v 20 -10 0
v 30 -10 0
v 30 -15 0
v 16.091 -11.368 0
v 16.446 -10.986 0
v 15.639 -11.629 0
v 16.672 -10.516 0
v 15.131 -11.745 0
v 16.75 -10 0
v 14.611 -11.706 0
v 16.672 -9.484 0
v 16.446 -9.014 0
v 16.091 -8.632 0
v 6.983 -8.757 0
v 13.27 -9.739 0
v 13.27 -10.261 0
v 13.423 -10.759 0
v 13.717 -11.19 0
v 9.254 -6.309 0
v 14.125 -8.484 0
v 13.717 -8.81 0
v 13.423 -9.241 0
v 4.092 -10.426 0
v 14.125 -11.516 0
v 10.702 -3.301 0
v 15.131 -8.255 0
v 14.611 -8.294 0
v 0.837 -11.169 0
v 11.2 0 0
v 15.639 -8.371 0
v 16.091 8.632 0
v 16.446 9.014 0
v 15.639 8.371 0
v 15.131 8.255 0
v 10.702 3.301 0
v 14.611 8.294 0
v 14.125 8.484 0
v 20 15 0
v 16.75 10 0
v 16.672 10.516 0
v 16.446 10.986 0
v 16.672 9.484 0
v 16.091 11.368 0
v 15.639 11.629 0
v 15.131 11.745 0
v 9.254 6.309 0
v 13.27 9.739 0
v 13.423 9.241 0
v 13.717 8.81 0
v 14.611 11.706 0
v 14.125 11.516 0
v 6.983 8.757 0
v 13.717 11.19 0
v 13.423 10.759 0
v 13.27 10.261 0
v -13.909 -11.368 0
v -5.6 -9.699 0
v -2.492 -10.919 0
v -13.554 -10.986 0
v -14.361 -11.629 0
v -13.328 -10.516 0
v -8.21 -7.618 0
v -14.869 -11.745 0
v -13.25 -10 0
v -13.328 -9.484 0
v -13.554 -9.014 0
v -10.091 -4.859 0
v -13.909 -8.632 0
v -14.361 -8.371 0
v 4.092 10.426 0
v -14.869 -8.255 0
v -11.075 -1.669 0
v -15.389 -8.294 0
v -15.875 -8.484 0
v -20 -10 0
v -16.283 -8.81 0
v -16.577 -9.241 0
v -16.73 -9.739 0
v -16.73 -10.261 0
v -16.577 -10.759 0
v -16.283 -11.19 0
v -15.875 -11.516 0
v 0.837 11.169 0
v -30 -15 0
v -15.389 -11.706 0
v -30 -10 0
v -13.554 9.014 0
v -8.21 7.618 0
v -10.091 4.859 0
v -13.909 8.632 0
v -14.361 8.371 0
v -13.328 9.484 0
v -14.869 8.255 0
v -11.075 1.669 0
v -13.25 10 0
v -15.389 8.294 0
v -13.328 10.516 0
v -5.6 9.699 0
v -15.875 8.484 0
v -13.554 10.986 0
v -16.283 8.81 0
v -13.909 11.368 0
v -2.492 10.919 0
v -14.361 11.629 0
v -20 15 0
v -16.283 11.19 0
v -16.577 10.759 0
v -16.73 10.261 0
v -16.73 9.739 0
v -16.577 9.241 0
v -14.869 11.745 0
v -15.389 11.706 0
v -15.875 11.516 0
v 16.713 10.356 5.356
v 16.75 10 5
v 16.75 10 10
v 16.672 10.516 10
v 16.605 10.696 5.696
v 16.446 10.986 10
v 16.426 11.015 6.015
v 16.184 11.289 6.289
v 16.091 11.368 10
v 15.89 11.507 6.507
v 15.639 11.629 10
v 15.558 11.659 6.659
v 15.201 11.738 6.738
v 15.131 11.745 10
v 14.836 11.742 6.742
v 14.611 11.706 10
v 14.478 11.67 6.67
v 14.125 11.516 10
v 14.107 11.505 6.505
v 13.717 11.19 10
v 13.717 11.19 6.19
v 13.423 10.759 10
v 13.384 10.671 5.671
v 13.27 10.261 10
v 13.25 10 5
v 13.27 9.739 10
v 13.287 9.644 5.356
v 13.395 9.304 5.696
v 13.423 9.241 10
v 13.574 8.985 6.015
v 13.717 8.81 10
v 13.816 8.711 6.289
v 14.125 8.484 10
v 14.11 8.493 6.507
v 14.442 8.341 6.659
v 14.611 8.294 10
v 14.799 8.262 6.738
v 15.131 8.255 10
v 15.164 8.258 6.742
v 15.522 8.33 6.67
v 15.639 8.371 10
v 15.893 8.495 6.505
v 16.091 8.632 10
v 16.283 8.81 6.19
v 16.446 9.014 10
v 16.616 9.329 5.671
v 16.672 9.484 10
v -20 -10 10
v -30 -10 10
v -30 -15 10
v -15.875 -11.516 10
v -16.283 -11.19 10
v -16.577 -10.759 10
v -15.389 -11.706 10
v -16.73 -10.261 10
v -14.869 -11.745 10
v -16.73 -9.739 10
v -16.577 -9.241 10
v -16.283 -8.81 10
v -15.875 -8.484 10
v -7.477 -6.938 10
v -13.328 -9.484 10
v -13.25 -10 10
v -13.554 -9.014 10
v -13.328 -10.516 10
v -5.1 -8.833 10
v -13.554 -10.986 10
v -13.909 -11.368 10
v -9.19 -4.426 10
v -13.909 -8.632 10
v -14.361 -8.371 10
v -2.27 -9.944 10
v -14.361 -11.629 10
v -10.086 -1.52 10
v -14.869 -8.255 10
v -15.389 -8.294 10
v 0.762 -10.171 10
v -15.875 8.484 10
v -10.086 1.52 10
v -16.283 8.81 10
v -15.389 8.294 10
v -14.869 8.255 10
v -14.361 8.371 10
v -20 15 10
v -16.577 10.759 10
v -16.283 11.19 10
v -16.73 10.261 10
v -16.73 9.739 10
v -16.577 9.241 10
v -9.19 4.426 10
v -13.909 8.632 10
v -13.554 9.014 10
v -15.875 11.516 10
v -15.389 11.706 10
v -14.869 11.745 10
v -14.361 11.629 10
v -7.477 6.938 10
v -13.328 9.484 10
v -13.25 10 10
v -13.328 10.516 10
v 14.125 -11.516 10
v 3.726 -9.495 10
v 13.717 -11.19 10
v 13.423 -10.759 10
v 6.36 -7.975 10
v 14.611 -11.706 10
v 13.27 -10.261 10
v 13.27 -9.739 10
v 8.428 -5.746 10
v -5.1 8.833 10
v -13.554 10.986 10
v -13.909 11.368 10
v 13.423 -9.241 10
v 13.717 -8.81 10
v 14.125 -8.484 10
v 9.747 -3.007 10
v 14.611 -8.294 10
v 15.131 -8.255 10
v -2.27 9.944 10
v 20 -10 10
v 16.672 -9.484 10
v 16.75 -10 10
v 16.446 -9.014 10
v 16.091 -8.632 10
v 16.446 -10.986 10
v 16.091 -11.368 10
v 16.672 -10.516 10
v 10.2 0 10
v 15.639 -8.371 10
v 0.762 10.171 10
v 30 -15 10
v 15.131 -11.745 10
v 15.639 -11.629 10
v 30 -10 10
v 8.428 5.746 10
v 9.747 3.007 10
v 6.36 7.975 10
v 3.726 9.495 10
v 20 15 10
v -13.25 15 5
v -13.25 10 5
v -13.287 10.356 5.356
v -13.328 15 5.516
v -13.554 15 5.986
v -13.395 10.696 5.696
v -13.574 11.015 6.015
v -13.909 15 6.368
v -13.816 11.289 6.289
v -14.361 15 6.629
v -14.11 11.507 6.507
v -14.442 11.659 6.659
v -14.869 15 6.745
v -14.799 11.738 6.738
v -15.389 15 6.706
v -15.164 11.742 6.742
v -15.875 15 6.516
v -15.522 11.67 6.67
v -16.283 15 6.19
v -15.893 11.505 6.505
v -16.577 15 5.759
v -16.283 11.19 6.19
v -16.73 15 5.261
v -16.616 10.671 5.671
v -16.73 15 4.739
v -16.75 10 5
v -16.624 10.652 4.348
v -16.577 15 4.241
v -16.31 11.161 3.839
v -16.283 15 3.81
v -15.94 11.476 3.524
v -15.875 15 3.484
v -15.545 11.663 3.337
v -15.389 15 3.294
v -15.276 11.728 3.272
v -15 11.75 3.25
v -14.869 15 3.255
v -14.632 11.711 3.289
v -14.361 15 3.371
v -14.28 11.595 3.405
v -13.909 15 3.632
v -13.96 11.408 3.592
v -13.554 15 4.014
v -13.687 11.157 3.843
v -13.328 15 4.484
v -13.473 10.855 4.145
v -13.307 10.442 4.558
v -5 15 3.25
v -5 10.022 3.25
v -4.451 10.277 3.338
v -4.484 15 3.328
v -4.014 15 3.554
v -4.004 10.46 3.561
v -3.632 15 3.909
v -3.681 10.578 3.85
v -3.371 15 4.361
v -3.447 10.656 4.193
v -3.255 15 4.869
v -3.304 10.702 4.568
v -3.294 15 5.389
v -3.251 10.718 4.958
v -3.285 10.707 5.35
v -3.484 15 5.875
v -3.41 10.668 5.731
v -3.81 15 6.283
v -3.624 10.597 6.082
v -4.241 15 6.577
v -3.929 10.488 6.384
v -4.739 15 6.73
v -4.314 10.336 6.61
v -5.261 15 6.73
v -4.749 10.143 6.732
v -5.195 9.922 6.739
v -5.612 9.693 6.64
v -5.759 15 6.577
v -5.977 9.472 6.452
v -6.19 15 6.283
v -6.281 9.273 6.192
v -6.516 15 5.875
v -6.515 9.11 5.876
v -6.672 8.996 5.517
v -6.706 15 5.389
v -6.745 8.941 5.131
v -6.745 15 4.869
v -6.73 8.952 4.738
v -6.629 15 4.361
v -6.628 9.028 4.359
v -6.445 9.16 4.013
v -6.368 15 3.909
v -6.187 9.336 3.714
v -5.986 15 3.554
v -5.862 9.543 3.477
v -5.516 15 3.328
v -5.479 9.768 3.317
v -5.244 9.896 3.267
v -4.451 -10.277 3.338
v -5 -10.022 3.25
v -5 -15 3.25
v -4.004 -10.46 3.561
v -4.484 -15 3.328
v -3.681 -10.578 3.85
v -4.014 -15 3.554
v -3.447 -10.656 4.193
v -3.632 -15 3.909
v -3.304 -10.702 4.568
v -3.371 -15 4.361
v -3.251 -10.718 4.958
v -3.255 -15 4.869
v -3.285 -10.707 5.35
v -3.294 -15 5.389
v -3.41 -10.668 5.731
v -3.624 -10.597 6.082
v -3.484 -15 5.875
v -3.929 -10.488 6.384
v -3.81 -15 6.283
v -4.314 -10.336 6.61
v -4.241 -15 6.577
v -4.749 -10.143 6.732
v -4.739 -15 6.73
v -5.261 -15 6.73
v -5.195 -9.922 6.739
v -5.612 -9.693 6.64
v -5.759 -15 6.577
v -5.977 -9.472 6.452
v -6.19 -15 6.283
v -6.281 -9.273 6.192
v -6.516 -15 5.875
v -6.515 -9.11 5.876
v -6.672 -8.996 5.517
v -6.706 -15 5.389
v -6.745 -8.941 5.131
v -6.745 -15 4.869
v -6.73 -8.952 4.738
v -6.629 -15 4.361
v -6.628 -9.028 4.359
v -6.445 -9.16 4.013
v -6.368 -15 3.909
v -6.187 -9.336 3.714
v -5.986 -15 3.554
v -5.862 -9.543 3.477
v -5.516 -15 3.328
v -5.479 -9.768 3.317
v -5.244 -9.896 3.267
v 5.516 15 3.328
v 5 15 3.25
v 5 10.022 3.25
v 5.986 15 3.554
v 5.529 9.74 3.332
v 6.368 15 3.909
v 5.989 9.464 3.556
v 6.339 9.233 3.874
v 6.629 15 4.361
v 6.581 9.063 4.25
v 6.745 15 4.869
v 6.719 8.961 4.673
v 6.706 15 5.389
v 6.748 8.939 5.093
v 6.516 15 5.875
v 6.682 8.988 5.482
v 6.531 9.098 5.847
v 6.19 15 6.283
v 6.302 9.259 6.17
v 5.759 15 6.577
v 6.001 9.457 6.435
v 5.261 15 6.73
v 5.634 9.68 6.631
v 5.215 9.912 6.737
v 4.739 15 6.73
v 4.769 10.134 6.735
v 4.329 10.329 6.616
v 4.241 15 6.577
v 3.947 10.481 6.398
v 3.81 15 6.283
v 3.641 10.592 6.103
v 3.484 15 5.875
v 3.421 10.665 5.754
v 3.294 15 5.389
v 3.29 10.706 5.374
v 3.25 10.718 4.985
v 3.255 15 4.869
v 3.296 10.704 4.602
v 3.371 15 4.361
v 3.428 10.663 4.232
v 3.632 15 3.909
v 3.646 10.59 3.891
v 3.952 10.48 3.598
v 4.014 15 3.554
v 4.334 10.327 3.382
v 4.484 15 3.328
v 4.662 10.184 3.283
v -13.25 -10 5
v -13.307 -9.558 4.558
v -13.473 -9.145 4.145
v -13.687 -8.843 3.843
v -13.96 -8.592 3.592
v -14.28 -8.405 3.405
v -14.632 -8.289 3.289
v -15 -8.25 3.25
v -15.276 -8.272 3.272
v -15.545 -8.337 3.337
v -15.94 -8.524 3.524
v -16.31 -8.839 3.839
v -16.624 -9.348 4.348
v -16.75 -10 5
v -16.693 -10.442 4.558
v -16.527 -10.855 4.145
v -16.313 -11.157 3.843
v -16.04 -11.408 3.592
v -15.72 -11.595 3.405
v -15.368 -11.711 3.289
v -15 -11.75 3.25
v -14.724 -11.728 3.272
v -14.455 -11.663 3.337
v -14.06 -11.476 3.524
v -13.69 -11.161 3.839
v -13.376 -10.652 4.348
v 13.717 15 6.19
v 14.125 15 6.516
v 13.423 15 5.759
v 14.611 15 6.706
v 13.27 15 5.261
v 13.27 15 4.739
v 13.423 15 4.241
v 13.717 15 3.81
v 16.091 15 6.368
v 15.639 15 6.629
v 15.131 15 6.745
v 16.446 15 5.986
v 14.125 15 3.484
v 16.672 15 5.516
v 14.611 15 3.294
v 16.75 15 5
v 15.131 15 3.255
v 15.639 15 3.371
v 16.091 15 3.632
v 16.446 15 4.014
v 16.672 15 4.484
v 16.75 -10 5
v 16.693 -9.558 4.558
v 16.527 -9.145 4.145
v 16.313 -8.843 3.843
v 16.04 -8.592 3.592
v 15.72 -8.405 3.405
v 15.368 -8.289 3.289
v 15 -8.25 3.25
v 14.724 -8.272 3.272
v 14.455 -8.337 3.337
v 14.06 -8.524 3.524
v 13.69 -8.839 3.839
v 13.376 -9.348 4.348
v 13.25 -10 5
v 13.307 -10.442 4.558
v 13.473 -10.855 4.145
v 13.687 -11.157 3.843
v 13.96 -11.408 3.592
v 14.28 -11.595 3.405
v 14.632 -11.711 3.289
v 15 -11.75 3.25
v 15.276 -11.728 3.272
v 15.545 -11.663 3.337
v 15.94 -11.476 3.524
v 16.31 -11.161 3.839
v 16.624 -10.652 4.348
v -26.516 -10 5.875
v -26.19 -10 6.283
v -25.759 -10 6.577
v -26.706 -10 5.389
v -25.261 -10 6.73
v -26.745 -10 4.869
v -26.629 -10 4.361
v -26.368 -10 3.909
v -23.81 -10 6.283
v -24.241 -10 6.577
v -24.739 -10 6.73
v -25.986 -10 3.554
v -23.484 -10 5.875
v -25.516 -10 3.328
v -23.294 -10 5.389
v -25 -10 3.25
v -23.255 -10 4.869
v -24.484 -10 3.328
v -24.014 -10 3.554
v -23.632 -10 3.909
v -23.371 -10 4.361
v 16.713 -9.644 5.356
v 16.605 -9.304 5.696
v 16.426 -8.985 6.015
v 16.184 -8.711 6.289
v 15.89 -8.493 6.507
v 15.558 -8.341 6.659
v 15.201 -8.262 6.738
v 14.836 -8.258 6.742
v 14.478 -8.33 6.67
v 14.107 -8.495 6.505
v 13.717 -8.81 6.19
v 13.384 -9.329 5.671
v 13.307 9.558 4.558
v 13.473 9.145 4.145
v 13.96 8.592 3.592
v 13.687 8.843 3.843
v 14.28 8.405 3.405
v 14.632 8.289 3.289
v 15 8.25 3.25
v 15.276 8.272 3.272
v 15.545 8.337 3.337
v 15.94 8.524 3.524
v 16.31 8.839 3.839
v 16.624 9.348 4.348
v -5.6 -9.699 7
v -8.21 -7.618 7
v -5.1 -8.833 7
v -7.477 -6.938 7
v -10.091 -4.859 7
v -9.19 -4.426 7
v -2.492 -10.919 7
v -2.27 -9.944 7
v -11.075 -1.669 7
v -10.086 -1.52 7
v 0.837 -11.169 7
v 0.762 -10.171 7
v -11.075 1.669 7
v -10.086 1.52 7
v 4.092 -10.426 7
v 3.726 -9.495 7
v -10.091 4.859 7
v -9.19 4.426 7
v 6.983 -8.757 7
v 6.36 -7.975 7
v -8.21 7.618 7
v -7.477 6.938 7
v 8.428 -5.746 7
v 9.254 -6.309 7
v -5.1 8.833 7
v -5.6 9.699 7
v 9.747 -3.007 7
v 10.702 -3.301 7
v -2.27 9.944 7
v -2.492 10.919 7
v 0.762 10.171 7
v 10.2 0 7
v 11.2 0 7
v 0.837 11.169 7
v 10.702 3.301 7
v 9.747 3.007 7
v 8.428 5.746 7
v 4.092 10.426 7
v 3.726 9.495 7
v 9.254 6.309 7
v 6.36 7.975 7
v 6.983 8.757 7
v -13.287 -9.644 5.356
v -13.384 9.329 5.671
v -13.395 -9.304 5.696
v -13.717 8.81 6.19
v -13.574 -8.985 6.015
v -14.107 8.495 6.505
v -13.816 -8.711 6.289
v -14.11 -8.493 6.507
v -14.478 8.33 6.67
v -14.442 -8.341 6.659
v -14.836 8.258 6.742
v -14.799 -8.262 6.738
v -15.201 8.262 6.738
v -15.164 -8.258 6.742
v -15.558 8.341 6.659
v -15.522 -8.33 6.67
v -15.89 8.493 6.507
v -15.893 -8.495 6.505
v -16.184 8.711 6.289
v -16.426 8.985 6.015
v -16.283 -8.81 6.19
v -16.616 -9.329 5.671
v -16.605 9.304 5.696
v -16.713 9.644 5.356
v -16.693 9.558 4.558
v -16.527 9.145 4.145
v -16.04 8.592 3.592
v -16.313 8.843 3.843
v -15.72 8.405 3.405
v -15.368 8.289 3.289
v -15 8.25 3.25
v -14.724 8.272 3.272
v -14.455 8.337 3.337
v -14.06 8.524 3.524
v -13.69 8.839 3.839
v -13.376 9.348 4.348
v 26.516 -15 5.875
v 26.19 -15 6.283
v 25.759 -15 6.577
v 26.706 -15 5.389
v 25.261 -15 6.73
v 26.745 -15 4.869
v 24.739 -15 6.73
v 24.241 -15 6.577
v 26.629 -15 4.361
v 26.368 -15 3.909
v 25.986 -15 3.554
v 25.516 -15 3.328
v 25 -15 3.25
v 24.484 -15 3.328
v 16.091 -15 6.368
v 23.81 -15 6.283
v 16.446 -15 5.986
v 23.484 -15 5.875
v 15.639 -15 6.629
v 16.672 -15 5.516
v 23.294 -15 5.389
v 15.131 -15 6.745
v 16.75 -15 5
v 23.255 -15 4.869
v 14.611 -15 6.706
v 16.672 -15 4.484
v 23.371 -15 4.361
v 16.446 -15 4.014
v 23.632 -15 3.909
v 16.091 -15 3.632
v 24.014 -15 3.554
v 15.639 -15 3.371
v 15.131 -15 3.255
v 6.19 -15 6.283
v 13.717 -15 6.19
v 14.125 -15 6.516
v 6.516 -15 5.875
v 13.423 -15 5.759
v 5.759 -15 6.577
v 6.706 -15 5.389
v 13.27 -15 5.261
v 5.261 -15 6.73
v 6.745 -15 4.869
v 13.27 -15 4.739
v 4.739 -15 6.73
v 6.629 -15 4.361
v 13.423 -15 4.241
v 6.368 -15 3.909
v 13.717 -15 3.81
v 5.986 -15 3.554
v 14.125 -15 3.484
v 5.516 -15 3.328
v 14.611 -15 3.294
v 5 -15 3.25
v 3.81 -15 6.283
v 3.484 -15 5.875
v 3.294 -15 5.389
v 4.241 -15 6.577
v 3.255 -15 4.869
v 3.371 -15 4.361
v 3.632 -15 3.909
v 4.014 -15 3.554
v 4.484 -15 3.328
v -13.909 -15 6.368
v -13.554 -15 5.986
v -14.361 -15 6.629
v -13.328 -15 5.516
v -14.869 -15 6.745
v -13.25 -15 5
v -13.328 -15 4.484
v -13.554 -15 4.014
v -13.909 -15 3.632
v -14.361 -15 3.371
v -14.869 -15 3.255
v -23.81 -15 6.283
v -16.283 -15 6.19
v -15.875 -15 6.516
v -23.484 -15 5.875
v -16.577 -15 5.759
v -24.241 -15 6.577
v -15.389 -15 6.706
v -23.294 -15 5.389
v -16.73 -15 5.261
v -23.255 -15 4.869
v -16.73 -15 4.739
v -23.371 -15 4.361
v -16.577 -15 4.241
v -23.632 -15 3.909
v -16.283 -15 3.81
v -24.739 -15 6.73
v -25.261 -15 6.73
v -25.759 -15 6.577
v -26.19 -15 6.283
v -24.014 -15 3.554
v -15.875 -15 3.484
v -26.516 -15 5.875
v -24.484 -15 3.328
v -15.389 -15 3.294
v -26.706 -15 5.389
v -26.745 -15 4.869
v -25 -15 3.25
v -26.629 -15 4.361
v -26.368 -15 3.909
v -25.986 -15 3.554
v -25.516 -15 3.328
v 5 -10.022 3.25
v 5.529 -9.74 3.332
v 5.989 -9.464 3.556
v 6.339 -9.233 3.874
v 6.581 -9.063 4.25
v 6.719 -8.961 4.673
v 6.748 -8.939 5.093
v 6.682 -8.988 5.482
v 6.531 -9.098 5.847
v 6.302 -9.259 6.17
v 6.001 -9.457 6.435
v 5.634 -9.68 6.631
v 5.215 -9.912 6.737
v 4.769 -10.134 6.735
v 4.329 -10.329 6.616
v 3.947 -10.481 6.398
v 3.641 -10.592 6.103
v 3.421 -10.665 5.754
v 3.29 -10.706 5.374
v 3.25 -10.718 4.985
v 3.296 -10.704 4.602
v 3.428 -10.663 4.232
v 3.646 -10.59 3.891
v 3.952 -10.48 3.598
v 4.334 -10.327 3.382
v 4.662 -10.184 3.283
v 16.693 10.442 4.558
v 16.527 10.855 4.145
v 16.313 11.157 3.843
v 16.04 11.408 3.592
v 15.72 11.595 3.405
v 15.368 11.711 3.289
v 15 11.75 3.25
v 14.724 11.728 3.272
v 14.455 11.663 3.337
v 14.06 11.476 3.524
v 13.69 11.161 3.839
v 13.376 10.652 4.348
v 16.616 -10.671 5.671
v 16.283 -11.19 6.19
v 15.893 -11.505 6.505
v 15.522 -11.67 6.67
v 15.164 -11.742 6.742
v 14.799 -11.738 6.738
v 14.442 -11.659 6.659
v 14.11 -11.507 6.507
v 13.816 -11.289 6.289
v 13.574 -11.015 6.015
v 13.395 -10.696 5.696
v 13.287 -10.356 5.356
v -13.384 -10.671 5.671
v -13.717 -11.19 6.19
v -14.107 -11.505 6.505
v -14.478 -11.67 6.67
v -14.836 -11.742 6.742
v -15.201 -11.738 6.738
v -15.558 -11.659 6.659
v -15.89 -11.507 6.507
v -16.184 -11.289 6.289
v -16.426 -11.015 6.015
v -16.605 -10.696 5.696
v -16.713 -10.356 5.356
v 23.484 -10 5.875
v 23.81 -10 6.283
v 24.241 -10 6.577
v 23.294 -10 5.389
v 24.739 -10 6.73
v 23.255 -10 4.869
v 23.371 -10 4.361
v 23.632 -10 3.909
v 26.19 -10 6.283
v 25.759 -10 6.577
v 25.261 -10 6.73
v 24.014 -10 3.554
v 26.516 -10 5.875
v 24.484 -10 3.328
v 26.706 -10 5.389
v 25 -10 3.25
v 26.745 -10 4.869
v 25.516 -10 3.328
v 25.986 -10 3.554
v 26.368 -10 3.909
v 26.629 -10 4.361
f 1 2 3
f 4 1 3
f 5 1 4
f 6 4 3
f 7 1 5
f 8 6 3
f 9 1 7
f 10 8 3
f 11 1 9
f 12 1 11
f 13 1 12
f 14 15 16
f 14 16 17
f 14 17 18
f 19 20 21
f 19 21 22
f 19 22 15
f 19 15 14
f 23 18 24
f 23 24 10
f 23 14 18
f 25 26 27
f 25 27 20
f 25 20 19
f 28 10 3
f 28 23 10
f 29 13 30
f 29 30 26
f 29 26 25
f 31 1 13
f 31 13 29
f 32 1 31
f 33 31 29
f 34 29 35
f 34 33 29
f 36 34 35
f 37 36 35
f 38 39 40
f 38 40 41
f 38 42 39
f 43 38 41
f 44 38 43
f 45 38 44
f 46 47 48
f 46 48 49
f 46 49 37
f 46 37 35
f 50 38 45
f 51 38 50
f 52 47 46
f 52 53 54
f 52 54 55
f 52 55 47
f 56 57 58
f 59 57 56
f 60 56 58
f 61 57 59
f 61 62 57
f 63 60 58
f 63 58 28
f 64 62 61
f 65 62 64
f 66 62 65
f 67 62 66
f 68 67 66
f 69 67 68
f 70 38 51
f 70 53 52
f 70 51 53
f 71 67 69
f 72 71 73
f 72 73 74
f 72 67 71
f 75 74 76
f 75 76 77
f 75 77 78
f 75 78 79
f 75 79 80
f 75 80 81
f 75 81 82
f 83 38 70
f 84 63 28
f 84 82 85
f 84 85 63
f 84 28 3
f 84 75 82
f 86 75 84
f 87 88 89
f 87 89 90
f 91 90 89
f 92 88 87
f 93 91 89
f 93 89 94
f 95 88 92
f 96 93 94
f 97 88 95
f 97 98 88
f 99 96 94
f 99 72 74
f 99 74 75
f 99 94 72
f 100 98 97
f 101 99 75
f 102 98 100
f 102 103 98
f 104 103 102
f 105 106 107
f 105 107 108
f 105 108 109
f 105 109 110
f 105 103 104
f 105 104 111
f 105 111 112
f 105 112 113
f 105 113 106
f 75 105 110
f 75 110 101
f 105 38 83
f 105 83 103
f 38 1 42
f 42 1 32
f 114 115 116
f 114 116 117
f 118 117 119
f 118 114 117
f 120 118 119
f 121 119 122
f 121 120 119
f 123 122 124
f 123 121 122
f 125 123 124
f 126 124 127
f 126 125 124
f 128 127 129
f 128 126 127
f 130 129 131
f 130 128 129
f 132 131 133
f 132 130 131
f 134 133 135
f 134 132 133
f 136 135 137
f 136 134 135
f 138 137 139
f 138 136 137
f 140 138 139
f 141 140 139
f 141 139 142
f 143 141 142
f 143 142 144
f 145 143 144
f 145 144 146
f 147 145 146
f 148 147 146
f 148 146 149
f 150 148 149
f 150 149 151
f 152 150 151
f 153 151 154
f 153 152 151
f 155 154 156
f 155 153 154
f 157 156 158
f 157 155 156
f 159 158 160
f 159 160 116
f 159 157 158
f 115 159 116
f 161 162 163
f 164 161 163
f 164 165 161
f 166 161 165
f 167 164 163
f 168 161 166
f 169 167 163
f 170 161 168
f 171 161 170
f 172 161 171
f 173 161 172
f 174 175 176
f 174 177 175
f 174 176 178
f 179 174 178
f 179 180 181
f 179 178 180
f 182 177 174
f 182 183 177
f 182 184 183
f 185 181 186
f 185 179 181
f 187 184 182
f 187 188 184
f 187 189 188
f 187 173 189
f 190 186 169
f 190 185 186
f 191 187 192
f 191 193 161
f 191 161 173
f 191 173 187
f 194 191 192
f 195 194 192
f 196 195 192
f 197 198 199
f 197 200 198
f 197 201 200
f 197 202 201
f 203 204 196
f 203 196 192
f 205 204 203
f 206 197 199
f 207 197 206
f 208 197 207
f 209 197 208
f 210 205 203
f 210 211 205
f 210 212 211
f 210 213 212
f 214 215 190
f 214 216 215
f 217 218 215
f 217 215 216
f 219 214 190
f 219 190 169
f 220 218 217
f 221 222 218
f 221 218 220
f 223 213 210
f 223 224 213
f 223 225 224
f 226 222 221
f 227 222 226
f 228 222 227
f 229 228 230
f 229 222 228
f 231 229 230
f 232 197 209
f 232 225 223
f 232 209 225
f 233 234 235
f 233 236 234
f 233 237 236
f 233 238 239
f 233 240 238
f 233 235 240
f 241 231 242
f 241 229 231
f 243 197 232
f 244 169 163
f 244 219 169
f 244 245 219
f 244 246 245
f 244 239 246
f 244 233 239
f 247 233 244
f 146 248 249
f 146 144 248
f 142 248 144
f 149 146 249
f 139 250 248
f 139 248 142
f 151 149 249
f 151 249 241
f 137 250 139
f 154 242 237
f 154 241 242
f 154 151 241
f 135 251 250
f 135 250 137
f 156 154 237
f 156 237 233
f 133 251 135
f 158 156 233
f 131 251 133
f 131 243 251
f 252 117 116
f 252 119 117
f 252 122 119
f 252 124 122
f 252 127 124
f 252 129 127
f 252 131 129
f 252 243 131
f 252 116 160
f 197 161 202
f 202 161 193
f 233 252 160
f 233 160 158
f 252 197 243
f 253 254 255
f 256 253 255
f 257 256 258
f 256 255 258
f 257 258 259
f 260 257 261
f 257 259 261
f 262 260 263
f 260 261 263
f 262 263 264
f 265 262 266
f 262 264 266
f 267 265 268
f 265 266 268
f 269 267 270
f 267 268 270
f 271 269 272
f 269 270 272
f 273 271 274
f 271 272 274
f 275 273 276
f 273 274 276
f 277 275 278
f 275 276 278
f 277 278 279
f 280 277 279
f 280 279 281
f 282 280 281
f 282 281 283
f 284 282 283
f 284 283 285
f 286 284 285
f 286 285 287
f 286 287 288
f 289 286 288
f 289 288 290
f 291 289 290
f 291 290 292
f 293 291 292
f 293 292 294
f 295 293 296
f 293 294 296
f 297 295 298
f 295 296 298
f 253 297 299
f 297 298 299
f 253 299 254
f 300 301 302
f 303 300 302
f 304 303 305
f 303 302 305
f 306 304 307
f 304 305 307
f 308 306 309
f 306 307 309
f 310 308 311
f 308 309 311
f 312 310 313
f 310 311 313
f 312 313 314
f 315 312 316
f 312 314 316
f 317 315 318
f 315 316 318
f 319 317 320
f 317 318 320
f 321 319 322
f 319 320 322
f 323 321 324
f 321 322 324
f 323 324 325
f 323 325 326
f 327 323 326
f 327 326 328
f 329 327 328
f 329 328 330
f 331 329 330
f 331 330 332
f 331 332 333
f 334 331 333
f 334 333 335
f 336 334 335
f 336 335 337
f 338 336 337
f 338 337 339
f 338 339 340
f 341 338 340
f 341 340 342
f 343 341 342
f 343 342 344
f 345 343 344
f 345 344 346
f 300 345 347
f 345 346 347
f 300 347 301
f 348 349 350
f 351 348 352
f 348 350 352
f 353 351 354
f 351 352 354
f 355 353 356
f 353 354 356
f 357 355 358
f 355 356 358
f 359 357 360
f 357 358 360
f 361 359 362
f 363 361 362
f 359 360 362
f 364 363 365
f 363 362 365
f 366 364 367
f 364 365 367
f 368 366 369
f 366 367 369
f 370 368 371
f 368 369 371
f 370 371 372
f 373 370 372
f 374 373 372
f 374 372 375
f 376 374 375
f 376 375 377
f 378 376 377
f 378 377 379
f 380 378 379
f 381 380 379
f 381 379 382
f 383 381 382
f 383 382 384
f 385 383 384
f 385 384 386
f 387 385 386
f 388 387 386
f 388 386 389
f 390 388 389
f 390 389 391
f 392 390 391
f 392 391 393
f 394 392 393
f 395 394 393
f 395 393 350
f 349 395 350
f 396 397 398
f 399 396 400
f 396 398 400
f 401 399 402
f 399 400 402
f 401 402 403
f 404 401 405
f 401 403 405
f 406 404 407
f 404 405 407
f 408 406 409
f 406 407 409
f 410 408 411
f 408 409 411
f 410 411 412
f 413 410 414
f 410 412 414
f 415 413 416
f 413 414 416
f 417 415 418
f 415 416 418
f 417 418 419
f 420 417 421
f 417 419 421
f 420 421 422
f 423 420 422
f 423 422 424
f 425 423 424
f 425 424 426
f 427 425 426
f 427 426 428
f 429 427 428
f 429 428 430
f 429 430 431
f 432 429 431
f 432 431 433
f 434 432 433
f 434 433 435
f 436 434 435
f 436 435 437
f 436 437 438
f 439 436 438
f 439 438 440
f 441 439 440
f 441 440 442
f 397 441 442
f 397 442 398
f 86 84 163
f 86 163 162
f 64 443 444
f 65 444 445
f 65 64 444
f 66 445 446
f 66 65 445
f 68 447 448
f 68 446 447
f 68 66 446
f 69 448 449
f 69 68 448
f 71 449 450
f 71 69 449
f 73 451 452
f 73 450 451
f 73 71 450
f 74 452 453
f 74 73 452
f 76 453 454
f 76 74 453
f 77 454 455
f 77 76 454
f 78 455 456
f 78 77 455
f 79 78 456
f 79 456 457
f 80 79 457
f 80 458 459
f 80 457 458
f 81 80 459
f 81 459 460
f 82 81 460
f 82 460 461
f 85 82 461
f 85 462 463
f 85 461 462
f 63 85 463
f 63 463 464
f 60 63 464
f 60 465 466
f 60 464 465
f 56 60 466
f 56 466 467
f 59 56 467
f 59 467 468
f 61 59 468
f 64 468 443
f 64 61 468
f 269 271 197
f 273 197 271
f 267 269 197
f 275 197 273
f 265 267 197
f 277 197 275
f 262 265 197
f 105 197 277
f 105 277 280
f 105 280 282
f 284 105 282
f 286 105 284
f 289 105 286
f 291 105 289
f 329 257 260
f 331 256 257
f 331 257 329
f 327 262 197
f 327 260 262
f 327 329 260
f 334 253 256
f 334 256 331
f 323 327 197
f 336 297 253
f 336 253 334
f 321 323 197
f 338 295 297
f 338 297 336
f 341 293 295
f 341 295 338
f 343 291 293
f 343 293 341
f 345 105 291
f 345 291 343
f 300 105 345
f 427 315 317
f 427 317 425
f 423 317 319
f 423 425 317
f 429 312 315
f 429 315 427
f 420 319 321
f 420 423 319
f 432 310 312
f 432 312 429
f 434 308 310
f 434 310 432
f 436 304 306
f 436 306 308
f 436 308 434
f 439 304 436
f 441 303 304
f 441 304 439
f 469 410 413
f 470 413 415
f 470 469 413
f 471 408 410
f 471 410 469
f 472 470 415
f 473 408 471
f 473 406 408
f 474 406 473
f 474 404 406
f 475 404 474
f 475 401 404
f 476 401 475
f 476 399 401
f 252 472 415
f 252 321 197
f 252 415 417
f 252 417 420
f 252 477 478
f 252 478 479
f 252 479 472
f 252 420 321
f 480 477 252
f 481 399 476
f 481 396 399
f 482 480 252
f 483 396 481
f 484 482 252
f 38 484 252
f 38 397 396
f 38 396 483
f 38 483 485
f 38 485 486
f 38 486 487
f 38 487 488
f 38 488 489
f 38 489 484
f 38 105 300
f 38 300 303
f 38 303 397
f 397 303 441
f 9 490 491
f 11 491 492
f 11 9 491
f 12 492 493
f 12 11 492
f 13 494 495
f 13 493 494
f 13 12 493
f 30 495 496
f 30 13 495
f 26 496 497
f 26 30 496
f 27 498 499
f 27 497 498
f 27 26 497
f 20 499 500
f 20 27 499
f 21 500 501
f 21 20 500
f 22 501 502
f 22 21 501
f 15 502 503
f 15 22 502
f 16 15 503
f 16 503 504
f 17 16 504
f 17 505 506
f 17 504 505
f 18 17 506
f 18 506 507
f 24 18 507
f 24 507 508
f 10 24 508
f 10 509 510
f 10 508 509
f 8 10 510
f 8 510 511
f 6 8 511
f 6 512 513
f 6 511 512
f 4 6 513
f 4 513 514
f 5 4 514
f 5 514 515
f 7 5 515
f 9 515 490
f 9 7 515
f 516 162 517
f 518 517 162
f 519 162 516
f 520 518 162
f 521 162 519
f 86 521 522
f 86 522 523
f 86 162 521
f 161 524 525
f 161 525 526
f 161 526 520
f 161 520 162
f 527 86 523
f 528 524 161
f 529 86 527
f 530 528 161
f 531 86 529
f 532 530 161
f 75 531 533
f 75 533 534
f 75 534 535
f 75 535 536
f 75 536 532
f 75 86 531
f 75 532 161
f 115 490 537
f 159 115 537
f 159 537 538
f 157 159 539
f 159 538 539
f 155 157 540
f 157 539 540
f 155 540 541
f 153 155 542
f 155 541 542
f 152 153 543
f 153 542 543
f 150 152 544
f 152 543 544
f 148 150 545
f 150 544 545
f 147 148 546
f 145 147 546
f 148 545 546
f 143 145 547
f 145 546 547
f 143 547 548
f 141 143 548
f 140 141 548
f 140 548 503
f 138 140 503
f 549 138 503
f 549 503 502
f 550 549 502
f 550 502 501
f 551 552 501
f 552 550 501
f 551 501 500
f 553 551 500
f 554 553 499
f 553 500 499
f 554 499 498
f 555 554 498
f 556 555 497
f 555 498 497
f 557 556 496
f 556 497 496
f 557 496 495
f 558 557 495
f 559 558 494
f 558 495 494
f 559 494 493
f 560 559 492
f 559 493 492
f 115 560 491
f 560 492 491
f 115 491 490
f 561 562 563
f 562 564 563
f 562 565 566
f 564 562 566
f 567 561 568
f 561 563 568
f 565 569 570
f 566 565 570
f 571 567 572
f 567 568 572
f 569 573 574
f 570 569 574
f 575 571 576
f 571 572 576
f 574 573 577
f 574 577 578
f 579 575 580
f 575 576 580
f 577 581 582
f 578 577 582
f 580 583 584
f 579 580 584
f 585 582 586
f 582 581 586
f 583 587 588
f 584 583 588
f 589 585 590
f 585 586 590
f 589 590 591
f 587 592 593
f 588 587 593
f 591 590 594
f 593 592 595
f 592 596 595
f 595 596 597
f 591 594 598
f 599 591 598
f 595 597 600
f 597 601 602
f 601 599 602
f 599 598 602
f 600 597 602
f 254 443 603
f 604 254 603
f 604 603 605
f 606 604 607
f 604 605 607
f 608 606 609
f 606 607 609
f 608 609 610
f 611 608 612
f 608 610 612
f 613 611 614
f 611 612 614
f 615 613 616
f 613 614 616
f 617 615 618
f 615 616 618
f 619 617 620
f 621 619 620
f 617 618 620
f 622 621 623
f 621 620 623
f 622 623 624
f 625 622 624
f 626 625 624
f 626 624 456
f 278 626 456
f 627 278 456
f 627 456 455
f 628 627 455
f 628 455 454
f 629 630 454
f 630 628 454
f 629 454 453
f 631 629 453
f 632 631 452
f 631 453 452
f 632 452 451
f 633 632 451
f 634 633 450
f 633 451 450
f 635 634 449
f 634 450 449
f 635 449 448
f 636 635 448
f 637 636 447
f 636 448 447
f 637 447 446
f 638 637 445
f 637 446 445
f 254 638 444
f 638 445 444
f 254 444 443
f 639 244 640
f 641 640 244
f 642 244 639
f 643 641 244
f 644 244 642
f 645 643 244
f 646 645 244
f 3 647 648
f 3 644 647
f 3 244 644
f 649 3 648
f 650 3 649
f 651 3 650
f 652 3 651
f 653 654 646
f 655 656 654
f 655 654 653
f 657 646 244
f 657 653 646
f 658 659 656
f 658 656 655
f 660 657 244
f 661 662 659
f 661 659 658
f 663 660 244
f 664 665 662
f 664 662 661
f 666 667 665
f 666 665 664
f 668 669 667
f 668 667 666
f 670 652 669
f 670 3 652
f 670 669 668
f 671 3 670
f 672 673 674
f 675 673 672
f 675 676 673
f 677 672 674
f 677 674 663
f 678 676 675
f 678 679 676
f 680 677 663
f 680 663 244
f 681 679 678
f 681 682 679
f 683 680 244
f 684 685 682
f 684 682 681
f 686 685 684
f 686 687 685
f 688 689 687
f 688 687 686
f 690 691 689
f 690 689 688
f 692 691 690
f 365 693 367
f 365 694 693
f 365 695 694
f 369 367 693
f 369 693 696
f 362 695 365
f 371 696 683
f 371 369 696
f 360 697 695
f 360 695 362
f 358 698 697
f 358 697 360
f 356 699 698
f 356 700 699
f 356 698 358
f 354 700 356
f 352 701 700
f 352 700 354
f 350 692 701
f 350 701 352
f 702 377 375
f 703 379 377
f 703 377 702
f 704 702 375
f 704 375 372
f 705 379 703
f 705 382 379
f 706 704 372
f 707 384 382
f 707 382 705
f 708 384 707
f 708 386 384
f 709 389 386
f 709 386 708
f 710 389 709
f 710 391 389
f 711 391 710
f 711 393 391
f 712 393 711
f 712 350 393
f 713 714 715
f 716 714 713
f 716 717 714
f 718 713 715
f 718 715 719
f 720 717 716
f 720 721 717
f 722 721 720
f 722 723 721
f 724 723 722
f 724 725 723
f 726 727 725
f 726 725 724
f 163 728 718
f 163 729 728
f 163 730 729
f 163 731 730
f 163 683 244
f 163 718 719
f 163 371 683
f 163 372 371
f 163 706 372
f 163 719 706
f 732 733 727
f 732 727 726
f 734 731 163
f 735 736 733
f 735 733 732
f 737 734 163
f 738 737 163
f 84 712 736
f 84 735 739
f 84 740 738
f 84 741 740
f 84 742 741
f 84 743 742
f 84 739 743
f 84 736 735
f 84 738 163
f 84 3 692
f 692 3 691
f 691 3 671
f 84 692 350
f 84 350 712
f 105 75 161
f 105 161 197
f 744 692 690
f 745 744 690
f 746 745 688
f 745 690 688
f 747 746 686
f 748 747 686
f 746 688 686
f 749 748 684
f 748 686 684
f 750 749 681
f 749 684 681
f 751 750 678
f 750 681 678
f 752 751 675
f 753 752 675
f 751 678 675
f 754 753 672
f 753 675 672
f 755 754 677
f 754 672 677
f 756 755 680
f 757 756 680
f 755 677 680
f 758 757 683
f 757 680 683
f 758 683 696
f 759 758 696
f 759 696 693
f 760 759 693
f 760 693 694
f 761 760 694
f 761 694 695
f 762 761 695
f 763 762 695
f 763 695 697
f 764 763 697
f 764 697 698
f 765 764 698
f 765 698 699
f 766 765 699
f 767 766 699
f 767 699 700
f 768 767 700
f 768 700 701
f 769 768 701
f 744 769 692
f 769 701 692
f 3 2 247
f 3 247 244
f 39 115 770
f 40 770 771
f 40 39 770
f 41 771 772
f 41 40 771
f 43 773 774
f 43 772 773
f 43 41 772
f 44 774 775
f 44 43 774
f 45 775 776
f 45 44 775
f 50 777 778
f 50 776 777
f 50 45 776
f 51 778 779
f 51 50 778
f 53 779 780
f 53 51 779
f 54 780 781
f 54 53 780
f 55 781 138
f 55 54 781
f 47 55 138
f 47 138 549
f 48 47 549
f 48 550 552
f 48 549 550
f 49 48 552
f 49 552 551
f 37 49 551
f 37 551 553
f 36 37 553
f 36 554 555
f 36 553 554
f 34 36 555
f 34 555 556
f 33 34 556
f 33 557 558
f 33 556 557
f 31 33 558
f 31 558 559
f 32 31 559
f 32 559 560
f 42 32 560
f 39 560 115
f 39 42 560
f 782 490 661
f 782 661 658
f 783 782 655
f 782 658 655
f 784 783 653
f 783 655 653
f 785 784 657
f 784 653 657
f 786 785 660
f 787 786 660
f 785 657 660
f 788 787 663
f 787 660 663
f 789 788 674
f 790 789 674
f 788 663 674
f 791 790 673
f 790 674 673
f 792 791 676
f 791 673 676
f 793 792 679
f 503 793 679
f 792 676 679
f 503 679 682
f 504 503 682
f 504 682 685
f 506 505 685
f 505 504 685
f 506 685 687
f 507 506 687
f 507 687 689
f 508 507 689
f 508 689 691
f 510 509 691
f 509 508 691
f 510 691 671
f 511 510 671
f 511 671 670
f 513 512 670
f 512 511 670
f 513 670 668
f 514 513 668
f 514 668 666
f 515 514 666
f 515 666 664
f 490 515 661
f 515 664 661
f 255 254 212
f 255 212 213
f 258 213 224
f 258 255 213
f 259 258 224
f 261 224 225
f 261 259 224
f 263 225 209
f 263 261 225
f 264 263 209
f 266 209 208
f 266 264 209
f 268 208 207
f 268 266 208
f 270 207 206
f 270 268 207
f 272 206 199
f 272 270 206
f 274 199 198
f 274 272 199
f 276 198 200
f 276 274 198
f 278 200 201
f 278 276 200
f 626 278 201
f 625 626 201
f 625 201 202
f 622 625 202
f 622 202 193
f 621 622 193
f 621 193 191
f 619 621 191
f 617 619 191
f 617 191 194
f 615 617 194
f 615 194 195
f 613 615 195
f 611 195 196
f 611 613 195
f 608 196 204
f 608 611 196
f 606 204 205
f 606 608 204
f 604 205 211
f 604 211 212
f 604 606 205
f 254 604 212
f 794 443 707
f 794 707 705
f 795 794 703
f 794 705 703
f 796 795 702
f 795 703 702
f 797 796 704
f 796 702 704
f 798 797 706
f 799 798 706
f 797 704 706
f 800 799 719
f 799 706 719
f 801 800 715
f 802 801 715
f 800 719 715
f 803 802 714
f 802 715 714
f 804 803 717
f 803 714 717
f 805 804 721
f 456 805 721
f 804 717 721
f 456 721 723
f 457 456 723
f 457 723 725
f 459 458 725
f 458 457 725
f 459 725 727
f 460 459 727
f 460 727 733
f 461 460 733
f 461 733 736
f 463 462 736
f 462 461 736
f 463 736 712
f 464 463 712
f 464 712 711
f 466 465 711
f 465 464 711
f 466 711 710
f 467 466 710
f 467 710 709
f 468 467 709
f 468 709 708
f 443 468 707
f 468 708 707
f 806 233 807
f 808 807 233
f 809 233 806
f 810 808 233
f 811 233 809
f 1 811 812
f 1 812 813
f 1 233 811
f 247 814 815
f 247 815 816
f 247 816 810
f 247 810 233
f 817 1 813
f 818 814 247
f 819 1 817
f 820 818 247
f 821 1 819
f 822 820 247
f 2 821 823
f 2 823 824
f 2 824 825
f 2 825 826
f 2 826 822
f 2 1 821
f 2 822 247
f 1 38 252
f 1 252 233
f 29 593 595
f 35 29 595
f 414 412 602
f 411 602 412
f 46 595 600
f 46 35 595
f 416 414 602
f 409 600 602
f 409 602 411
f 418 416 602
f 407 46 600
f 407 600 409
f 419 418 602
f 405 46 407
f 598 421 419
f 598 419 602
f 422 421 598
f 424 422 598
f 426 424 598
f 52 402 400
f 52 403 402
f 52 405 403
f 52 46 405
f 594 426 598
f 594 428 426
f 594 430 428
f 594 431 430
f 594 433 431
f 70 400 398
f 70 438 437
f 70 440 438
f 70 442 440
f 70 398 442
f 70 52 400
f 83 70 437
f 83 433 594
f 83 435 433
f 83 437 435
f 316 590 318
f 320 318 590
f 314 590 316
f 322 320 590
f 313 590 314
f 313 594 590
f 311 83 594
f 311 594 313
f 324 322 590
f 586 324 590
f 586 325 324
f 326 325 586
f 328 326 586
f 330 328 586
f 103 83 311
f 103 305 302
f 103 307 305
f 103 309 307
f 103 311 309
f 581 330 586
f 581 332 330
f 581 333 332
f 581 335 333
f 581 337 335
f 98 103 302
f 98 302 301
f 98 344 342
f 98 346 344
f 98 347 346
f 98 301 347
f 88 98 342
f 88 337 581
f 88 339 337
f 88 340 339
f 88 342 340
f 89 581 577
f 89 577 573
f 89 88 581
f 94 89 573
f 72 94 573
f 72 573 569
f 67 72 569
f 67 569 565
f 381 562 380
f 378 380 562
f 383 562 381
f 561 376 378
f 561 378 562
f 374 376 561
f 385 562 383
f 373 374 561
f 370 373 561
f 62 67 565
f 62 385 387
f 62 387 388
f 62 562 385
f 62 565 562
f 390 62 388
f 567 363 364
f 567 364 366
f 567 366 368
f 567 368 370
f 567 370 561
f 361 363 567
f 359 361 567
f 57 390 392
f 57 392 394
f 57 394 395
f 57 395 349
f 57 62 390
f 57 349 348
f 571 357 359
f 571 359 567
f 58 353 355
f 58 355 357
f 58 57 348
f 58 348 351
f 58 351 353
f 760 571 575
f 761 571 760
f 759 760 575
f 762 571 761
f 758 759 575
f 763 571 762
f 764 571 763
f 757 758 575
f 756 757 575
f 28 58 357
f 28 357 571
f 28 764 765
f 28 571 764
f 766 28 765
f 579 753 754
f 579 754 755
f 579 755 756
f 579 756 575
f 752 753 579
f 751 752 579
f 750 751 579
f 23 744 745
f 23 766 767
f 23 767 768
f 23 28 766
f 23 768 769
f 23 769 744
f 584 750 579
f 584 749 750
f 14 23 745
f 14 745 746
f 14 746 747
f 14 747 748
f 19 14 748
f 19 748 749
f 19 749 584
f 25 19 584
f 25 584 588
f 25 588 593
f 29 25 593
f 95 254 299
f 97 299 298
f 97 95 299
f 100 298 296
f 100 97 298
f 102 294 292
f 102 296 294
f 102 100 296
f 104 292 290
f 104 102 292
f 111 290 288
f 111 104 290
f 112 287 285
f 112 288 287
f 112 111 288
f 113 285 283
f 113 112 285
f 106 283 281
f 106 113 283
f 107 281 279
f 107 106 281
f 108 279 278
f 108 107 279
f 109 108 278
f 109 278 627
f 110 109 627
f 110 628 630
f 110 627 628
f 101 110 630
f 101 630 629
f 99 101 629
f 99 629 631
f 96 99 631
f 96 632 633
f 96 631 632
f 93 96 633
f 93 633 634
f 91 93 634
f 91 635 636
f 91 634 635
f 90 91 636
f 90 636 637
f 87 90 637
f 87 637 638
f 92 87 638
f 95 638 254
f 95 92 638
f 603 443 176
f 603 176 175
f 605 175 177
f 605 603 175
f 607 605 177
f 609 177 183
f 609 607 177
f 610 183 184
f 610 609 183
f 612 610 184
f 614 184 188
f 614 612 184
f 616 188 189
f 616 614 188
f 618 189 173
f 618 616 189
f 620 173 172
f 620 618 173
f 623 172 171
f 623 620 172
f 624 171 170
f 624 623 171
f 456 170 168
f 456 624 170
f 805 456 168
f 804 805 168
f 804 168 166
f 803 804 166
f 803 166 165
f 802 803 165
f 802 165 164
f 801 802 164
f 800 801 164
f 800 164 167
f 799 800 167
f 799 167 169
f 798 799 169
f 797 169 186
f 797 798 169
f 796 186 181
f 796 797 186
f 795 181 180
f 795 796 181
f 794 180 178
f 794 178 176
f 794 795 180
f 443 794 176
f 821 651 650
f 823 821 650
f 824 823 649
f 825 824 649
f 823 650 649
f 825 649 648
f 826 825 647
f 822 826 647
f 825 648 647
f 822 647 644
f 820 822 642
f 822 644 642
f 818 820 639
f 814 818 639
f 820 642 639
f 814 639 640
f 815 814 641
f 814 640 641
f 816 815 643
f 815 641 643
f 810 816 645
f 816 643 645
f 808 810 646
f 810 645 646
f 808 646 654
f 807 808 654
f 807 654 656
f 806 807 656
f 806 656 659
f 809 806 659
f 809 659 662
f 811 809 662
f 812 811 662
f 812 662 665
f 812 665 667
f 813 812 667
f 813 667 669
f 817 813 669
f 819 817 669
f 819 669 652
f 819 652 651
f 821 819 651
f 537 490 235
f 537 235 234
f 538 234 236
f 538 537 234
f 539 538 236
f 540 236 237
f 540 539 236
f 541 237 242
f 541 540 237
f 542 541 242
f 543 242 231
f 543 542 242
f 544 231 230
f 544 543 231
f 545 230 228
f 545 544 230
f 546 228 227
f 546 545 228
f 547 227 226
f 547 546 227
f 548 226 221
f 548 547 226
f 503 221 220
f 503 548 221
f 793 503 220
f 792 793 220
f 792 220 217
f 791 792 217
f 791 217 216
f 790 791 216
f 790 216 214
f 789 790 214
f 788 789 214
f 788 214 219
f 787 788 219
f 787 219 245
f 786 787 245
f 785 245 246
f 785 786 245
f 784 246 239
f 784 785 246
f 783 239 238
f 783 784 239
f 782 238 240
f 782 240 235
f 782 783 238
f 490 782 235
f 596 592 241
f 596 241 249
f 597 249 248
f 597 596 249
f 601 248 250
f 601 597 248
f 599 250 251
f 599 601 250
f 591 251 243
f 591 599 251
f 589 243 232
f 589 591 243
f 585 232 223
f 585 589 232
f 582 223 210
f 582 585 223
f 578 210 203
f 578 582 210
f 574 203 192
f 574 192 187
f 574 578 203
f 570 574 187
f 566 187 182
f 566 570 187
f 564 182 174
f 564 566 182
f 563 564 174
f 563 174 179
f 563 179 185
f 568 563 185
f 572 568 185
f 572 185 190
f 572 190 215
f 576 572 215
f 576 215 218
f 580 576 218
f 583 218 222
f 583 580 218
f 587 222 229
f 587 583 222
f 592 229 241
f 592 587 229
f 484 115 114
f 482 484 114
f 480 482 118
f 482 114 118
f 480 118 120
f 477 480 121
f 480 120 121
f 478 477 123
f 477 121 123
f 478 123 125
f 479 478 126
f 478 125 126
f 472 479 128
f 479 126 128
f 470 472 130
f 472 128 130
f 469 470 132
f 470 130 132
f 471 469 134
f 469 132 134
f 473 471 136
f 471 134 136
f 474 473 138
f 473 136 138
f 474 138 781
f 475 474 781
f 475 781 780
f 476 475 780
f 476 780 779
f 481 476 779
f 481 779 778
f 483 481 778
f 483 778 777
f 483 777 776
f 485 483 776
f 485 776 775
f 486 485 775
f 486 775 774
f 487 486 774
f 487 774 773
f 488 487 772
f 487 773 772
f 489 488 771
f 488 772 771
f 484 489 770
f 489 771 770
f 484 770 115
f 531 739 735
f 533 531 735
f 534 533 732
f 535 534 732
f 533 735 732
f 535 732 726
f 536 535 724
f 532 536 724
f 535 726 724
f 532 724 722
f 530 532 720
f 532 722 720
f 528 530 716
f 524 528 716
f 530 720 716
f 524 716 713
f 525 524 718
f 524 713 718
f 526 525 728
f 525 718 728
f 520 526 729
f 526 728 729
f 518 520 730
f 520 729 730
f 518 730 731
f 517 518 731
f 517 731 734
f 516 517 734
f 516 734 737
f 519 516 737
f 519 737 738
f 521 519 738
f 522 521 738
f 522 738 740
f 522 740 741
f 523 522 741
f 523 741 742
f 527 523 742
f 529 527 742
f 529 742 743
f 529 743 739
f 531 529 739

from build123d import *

# Parameters (mm, degrees)
ESQUISSE1_R             = 11.2
ESQUISSE1_R_2           = 1.75
BOSS_EXTRU_1_DEPTH      = 10
BOSS_EXTRU_2_START      = -3
ESQUISSE2_R             = 11.2
ESQUISSE2_R_2           = 10.2
BOSS_EXTRU_2_DEPTH      = 3
ESQUISSE3_R             = 1.75
ENL_V_MAT_EXTRU_1_DEPTH = 44.588989435


with BuildPart() as part:
    # Esquisse1 → Boss.-Extru.1 (new body)
    with BuildSketch(Plane.XY):
        Polygon((-20, -10), (-20, 15), (20, 15), (20, -10), (30, -10), (30, -15), (-30, -15), (-30, -10), align=None)
        Circle(ESQUISSE1_R, mode=Mode.SUBTRACT)
        with Locations((15, 10)):
            Circle(ESQUISSE1_R_2, mode=Mode.SUBTRACT)
        with Locations((-15, 10)):
            Circle(ESQUISSE1_R_2, mode=Mode.SUBTRACT)
        with Locations((-15, -10)):
            Circle(ESQUISSE1_R_2, mode=Mode.SUBTRACT)
        with Locations((15, -10)):
            Circle(ESQUISSE1_R_2, mode=Mode.SUBTRACT)
    extrude(amount=BOSS_EXTRU_1_DEPTH)

    # Esquisse2 → Boss.-Extru.2 (add)
    with BuildSketch(Plane.XY.offset(10).offset(BOSS_EXTRU_2_START)):
        Circle(ESQUISSE2_R)
        Circle(ESQUISSE2_R_2, mode=Mode.SUBTRACT)
    extrude(amount=BOSS_EXTRU_2_DEPTH)

    # Esquisse3 → Enlèv. mat.-Extru.1 (cut, through all)
    with BuildSketch(Plane.XZ.offset(15)):
        with Locations(Location((-25, 5, 0), (0, 0, 270))):
            Circle(ESQUISSE3_R)
        with Locations((-15, 5)):
            Circle(ESQUISSE3_R)
        with Locations(Location((-5, 5, 0), (0, 0, 270))):
            Circle(ESQUISSE3_R)
        with Locations(Location((5, 5, 0), (0, 0, 270))):
            Circle(ESQUISSE3_R)
        with Locations((15, 5)):
            Circle(ESQUISSE3_R)
        with Locations(Location((25, 5, 0), (0, 0, 270))):
            Circle(ESQUISSE3_R)
    extrude(amount=-ENL_V_MAT_EXTRU_1_DEPTH, mode=Mode.SUBTRACT)


solid = part.part
